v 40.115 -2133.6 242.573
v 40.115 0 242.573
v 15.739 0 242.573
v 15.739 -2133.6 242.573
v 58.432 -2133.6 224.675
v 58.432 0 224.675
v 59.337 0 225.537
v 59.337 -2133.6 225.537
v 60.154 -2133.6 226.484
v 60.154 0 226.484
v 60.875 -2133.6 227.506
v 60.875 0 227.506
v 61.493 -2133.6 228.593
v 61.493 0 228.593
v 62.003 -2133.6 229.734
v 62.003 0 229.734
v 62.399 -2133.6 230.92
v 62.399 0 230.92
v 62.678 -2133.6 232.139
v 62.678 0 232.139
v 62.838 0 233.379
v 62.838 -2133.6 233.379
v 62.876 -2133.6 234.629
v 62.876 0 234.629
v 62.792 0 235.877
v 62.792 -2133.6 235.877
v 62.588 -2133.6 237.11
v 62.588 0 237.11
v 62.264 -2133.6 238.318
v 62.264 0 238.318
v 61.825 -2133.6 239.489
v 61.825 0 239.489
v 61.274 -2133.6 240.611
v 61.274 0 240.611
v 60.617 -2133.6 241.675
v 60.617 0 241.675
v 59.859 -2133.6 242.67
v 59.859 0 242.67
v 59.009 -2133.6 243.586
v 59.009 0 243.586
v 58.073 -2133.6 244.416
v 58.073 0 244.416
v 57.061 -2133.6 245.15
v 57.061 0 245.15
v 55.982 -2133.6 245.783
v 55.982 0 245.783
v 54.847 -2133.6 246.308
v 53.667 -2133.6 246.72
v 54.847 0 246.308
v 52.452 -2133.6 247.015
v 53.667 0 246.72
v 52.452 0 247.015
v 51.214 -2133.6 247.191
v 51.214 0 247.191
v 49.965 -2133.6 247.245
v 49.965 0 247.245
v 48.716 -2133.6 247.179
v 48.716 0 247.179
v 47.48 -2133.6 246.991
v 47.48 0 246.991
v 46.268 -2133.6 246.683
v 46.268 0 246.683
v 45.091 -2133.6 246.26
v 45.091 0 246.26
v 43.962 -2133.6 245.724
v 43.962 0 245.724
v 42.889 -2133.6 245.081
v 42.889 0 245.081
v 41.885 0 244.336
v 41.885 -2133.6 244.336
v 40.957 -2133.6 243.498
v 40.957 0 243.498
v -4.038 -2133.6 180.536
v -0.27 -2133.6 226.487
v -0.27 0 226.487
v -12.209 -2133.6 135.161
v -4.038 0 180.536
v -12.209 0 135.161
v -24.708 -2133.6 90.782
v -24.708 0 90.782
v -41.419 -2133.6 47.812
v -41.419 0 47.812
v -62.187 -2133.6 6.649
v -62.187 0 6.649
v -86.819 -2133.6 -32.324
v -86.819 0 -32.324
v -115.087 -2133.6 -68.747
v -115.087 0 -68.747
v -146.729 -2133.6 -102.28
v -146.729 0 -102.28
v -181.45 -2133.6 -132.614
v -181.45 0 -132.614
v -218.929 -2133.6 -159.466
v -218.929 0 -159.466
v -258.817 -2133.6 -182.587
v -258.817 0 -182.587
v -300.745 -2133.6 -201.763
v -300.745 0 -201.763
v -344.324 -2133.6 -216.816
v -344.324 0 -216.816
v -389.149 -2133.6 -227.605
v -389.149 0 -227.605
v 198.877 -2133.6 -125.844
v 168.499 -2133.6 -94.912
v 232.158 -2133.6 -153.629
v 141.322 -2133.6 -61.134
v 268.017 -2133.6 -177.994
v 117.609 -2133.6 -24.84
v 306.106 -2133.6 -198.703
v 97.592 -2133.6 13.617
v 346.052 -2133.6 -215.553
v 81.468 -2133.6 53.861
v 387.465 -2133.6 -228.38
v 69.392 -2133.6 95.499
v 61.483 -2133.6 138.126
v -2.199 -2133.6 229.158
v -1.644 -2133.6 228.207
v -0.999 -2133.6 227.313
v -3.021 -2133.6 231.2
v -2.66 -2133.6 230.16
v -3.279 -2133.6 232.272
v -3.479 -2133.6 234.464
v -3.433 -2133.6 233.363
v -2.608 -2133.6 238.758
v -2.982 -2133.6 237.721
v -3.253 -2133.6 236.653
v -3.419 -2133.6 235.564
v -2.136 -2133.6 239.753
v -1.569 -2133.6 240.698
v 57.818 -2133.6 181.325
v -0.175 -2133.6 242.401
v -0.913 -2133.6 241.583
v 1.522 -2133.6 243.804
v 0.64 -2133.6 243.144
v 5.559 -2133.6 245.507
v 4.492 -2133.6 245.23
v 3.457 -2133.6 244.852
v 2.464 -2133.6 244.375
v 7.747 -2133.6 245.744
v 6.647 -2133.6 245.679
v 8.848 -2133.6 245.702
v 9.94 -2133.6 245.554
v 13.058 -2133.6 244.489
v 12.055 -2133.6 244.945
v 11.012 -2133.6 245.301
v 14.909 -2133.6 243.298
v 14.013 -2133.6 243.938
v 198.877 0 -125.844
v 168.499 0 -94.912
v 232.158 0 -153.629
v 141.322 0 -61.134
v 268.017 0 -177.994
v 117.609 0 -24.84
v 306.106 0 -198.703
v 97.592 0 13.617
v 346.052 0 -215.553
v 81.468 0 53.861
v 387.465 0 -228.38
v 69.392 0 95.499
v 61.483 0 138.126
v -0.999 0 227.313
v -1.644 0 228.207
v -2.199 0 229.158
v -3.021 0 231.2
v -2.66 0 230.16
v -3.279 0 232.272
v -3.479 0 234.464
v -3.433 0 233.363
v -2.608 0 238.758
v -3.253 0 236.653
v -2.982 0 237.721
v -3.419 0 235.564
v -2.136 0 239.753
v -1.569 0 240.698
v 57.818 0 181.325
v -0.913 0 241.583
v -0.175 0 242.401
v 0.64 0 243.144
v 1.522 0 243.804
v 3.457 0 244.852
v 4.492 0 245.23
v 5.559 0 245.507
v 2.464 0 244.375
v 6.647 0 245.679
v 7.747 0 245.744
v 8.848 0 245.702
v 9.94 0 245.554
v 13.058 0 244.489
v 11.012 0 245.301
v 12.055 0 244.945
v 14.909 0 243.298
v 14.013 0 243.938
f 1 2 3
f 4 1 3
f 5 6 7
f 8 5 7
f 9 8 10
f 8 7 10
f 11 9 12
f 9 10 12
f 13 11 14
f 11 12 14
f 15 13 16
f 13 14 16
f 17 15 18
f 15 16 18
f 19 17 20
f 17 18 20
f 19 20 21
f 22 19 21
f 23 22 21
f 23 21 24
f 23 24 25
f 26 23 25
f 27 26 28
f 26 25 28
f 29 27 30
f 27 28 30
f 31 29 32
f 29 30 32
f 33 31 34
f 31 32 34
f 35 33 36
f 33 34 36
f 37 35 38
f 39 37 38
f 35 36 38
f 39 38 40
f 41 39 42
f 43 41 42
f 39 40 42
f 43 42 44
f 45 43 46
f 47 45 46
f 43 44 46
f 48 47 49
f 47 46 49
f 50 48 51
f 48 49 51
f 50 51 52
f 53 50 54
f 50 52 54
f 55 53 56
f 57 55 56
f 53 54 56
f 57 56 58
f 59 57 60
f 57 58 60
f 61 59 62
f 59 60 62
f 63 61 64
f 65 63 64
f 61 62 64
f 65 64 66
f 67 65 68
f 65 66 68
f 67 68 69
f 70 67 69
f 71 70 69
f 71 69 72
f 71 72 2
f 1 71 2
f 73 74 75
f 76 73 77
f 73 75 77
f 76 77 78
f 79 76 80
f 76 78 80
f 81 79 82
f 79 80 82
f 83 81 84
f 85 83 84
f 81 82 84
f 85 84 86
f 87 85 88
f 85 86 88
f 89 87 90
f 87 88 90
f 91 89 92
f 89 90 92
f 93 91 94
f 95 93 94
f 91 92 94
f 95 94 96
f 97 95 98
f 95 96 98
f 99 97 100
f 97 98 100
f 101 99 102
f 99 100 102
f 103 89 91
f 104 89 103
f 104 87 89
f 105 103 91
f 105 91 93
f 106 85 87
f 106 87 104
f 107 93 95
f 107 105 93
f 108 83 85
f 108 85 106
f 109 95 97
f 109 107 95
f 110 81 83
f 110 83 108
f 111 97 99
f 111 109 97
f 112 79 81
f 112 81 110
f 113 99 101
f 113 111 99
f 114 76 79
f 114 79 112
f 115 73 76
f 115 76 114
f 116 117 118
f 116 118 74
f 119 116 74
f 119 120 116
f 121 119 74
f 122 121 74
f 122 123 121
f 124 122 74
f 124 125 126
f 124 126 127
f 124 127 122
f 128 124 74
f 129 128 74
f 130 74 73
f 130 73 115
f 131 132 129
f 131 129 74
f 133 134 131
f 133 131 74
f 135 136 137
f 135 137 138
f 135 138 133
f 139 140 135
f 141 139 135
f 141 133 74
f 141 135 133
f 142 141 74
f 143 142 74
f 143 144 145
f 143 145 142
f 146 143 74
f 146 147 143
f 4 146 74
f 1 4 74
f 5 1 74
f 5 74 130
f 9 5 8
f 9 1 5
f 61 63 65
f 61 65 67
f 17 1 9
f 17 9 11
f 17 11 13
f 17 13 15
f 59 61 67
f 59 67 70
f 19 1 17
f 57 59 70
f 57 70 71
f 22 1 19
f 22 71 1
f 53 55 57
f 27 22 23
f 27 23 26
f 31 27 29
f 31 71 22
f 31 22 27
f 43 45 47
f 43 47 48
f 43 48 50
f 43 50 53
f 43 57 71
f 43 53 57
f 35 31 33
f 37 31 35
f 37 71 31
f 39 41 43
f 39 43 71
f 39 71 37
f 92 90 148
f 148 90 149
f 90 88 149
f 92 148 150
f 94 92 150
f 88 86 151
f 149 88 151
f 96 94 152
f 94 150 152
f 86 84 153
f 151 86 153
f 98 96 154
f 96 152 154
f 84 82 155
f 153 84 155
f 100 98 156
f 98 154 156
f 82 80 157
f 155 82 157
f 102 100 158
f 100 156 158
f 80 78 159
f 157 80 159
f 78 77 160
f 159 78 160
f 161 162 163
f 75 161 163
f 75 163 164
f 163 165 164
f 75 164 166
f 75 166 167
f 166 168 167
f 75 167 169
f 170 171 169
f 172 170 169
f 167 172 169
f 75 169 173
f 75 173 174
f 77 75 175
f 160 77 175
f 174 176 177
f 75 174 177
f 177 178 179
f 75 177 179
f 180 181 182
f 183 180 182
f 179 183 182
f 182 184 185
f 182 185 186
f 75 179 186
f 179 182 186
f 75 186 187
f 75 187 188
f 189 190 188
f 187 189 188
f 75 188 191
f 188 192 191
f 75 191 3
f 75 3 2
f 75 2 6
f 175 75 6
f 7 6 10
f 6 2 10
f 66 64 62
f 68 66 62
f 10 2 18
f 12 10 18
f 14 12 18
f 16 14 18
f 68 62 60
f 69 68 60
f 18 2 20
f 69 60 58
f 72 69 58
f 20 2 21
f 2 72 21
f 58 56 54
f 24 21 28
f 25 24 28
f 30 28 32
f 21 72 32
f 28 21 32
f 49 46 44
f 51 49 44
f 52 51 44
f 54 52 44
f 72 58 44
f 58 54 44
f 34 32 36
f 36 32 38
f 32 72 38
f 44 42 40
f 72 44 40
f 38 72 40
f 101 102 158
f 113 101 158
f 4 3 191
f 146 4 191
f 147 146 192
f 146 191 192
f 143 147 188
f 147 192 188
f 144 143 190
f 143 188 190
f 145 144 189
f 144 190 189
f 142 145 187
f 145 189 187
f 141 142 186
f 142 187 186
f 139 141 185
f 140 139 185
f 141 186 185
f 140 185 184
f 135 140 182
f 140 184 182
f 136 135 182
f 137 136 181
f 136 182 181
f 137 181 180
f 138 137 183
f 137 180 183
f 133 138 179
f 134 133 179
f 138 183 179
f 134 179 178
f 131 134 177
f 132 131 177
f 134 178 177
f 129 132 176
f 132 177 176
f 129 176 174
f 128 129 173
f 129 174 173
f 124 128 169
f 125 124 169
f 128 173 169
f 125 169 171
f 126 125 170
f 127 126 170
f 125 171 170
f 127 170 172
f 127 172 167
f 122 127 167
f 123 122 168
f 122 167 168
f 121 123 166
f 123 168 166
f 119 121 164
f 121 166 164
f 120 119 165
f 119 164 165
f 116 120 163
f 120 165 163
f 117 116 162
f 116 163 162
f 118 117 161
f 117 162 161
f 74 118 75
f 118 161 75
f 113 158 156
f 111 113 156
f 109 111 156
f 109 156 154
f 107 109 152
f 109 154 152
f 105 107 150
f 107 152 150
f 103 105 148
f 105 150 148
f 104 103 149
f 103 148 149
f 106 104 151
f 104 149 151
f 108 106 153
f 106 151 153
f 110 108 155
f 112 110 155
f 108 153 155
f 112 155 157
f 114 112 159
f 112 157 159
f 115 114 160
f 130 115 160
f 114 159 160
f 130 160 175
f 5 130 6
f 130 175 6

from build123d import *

# Parameters (mm, degrees)
F1_DEPTH = 2133.6


with BuildPart() as f1:
    # F0 (on Front) → F1 (new body)
    with BuildSketch(Plane.XZ):
        with BuildLine():
            ThreePointArc((-0.27041, 226.486726), (-115.087389, -68.746585), (-389.148504, -227.605492))
            Line((-389.148504, -227.605492), (387.464732, -228.379771))
            ThreePointArc((387.464732, -228.379771), (141.321633, -61.134424), (58.43205, 224.674512))
            ThreePointArc((58.43205, 224.674512), (59.008561, 243.586212), (40.115219, 242.573104))
            Line((40.115219, 242.573104), (15.73921, 242.573104))
            ThreePointArc((15.73921, 242.573104), (-0.17472, 242.401296), (-0.27041, 226.486726))
        make_face()
    extrude(amount=F1_DEPTH)


solid = f1.part
